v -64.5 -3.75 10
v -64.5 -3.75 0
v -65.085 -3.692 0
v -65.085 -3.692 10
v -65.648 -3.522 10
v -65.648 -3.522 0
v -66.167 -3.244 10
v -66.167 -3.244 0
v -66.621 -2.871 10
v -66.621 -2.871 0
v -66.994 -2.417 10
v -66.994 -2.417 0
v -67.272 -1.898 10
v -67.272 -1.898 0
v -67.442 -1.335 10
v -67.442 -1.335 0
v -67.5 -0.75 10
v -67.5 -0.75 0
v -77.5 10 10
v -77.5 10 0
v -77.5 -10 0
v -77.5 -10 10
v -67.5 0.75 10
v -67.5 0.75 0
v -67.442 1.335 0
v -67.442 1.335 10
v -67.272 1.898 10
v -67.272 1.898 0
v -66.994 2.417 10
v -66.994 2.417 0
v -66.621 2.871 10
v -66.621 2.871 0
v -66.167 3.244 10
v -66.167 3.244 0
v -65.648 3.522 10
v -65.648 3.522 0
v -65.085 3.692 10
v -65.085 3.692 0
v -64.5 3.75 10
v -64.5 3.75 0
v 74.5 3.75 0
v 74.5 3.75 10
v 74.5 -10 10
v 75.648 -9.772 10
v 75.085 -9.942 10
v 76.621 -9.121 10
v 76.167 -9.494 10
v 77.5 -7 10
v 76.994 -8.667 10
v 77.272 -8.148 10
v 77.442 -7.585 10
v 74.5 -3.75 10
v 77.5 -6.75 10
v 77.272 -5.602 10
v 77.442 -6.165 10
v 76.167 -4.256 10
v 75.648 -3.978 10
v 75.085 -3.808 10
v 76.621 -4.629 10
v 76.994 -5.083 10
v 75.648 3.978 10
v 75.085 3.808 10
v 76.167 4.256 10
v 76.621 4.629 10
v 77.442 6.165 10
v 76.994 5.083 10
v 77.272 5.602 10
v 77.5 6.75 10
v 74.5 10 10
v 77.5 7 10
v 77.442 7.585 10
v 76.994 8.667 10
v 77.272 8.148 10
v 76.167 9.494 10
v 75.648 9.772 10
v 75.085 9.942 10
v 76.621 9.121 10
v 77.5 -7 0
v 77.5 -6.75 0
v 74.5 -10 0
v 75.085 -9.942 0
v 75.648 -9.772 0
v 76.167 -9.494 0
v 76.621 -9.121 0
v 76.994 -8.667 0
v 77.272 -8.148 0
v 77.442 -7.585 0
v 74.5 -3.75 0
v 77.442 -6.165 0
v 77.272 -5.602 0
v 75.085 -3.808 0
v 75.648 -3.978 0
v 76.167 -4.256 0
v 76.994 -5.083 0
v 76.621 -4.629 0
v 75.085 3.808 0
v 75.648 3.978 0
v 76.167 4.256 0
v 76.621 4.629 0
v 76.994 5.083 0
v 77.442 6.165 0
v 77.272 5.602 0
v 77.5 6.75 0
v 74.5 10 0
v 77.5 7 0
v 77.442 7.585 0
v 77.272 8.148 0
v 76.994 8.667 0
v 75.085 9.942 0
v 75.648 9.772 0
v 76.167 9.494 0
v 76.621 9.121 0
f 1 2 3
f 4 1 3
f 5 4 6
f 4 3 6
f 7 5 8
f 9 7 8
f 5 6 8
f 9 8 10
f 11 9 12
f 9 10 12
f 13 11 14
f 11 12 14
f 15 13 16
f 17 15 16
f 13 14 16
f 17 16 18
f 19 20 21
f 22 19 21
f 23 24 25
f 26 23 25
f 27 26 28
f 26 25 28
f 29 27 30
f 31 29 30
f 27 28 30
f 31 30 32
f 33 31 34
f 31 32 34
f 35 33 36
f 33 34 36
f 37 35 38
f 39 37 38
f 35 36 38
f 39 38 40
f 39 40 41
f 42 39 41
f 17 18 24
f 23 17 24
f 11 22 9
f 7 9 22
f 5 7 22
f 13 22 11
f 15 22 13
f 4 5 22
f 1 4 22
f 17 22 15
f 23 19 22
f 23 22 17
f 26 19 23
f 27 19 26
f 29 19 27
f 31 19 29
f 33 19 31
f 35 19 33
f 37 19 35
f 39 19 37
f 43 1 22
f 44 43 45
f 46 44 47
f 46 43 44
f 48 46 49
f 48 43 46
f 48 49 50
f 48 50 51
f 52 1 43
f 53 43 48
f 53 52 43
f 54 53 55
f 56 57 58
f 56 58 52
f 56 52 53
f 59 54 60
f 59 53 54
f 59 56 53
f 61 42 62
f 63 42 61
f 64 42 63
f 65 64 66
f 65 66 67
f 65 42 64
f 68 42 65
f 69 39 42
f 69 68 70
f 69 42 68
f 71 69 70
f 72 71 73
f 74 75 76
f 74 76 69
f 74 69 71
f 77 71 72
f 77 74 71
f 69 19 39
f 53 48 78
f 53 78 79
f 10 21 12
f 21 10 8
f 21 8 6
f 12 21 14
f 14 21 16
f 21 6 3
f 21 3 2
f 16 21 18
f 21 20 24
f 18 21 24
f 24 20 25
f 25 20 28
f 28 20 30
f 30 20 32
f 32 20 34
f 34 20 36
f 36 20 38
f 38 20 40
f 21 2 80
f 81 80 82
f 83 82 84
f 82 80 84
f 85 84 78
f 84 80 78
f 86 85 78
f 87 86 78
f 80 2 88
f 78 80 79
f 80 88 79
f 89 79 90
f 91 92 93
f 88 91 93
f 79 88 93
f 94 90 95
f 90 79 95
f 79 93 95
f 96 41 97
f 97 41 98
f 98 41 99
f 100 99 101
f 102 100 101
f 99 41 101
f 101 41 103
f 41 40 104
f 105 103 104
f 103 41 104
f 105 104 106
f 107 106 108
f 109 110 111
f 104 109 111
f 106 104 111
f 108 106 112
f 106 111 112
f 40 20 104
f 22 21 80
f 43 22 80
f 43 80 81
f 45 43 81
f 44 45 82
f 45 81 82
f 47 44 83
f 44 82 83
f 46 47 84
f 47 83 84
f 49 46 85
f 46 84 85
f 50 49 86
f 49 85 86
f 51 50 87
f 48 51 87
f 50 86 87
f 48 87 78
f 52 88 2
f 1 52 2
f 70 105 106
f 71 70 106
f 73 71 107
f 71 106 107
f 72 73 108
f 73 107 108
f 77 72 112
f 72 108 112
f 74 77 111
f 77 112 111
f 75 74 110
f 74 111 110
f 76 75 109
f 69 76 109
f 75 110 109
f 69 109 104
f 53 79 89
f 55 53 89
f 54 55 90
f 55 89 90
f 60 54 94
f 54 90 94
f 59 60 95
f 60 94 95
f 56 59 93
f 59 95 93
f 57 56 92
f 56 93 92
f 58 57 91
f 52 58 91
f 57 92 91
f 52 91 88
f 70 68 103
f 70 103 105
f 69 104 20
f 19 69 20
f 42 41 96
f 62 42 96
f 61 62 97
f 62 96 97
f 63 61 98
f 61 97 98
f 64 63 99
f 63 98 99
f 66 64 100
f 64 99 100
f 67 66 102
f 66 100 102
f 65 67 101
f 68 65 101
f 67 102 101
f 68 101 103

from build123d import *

# Parameters (mm, degrees)
F1_DEPTH = 10


with BuildPart() as f1:
    # F0 (on Top) → F1 (new body)
    with BuildSketch(Plane.XY):
        with BuildLine():
            Line((-77.5, -10), (74.5, -10))
            ThreePointArc((74.5, -10), (76.62132, -9.12132), (77.5, -7))
            Line((77.5, -7), (77.5, -6.75))
            ThreePointArc((77.5, -6.75), (76.62132, -4.62868), (74.5, -3.75))
            Line((74.5, -3.75), (-64.5, -3.75))
            ThreePointArc((-64.5, -3.75), (-66.62132, -2.87132), (-67.5, -0.75))
            Line((-67.5, -0.75), (-67.5, 0.75))
            ThreePointArc((-67.5, 0.75), (-66.62132, 2.87132), (-64.5, 3.75))
            Line((-64.5, 3.75), (74.5, 3.75))
            ThreePointArc((74.5, 3.75), (76.62132, 4.62868), (77.5, 6.75))
            Line((77.5, 6.75), (77.5, 7))
            ThreePointArc((77.5, 7), (76.62132, 9.12132), (74.5, 10))
            Line((74.5, 10), (-77.5, 10))
            Line((-77.5, 10), (-77.5, -10))
        make_face()
    extrude(amount=F1_DEPTH)


solid = f1.part
